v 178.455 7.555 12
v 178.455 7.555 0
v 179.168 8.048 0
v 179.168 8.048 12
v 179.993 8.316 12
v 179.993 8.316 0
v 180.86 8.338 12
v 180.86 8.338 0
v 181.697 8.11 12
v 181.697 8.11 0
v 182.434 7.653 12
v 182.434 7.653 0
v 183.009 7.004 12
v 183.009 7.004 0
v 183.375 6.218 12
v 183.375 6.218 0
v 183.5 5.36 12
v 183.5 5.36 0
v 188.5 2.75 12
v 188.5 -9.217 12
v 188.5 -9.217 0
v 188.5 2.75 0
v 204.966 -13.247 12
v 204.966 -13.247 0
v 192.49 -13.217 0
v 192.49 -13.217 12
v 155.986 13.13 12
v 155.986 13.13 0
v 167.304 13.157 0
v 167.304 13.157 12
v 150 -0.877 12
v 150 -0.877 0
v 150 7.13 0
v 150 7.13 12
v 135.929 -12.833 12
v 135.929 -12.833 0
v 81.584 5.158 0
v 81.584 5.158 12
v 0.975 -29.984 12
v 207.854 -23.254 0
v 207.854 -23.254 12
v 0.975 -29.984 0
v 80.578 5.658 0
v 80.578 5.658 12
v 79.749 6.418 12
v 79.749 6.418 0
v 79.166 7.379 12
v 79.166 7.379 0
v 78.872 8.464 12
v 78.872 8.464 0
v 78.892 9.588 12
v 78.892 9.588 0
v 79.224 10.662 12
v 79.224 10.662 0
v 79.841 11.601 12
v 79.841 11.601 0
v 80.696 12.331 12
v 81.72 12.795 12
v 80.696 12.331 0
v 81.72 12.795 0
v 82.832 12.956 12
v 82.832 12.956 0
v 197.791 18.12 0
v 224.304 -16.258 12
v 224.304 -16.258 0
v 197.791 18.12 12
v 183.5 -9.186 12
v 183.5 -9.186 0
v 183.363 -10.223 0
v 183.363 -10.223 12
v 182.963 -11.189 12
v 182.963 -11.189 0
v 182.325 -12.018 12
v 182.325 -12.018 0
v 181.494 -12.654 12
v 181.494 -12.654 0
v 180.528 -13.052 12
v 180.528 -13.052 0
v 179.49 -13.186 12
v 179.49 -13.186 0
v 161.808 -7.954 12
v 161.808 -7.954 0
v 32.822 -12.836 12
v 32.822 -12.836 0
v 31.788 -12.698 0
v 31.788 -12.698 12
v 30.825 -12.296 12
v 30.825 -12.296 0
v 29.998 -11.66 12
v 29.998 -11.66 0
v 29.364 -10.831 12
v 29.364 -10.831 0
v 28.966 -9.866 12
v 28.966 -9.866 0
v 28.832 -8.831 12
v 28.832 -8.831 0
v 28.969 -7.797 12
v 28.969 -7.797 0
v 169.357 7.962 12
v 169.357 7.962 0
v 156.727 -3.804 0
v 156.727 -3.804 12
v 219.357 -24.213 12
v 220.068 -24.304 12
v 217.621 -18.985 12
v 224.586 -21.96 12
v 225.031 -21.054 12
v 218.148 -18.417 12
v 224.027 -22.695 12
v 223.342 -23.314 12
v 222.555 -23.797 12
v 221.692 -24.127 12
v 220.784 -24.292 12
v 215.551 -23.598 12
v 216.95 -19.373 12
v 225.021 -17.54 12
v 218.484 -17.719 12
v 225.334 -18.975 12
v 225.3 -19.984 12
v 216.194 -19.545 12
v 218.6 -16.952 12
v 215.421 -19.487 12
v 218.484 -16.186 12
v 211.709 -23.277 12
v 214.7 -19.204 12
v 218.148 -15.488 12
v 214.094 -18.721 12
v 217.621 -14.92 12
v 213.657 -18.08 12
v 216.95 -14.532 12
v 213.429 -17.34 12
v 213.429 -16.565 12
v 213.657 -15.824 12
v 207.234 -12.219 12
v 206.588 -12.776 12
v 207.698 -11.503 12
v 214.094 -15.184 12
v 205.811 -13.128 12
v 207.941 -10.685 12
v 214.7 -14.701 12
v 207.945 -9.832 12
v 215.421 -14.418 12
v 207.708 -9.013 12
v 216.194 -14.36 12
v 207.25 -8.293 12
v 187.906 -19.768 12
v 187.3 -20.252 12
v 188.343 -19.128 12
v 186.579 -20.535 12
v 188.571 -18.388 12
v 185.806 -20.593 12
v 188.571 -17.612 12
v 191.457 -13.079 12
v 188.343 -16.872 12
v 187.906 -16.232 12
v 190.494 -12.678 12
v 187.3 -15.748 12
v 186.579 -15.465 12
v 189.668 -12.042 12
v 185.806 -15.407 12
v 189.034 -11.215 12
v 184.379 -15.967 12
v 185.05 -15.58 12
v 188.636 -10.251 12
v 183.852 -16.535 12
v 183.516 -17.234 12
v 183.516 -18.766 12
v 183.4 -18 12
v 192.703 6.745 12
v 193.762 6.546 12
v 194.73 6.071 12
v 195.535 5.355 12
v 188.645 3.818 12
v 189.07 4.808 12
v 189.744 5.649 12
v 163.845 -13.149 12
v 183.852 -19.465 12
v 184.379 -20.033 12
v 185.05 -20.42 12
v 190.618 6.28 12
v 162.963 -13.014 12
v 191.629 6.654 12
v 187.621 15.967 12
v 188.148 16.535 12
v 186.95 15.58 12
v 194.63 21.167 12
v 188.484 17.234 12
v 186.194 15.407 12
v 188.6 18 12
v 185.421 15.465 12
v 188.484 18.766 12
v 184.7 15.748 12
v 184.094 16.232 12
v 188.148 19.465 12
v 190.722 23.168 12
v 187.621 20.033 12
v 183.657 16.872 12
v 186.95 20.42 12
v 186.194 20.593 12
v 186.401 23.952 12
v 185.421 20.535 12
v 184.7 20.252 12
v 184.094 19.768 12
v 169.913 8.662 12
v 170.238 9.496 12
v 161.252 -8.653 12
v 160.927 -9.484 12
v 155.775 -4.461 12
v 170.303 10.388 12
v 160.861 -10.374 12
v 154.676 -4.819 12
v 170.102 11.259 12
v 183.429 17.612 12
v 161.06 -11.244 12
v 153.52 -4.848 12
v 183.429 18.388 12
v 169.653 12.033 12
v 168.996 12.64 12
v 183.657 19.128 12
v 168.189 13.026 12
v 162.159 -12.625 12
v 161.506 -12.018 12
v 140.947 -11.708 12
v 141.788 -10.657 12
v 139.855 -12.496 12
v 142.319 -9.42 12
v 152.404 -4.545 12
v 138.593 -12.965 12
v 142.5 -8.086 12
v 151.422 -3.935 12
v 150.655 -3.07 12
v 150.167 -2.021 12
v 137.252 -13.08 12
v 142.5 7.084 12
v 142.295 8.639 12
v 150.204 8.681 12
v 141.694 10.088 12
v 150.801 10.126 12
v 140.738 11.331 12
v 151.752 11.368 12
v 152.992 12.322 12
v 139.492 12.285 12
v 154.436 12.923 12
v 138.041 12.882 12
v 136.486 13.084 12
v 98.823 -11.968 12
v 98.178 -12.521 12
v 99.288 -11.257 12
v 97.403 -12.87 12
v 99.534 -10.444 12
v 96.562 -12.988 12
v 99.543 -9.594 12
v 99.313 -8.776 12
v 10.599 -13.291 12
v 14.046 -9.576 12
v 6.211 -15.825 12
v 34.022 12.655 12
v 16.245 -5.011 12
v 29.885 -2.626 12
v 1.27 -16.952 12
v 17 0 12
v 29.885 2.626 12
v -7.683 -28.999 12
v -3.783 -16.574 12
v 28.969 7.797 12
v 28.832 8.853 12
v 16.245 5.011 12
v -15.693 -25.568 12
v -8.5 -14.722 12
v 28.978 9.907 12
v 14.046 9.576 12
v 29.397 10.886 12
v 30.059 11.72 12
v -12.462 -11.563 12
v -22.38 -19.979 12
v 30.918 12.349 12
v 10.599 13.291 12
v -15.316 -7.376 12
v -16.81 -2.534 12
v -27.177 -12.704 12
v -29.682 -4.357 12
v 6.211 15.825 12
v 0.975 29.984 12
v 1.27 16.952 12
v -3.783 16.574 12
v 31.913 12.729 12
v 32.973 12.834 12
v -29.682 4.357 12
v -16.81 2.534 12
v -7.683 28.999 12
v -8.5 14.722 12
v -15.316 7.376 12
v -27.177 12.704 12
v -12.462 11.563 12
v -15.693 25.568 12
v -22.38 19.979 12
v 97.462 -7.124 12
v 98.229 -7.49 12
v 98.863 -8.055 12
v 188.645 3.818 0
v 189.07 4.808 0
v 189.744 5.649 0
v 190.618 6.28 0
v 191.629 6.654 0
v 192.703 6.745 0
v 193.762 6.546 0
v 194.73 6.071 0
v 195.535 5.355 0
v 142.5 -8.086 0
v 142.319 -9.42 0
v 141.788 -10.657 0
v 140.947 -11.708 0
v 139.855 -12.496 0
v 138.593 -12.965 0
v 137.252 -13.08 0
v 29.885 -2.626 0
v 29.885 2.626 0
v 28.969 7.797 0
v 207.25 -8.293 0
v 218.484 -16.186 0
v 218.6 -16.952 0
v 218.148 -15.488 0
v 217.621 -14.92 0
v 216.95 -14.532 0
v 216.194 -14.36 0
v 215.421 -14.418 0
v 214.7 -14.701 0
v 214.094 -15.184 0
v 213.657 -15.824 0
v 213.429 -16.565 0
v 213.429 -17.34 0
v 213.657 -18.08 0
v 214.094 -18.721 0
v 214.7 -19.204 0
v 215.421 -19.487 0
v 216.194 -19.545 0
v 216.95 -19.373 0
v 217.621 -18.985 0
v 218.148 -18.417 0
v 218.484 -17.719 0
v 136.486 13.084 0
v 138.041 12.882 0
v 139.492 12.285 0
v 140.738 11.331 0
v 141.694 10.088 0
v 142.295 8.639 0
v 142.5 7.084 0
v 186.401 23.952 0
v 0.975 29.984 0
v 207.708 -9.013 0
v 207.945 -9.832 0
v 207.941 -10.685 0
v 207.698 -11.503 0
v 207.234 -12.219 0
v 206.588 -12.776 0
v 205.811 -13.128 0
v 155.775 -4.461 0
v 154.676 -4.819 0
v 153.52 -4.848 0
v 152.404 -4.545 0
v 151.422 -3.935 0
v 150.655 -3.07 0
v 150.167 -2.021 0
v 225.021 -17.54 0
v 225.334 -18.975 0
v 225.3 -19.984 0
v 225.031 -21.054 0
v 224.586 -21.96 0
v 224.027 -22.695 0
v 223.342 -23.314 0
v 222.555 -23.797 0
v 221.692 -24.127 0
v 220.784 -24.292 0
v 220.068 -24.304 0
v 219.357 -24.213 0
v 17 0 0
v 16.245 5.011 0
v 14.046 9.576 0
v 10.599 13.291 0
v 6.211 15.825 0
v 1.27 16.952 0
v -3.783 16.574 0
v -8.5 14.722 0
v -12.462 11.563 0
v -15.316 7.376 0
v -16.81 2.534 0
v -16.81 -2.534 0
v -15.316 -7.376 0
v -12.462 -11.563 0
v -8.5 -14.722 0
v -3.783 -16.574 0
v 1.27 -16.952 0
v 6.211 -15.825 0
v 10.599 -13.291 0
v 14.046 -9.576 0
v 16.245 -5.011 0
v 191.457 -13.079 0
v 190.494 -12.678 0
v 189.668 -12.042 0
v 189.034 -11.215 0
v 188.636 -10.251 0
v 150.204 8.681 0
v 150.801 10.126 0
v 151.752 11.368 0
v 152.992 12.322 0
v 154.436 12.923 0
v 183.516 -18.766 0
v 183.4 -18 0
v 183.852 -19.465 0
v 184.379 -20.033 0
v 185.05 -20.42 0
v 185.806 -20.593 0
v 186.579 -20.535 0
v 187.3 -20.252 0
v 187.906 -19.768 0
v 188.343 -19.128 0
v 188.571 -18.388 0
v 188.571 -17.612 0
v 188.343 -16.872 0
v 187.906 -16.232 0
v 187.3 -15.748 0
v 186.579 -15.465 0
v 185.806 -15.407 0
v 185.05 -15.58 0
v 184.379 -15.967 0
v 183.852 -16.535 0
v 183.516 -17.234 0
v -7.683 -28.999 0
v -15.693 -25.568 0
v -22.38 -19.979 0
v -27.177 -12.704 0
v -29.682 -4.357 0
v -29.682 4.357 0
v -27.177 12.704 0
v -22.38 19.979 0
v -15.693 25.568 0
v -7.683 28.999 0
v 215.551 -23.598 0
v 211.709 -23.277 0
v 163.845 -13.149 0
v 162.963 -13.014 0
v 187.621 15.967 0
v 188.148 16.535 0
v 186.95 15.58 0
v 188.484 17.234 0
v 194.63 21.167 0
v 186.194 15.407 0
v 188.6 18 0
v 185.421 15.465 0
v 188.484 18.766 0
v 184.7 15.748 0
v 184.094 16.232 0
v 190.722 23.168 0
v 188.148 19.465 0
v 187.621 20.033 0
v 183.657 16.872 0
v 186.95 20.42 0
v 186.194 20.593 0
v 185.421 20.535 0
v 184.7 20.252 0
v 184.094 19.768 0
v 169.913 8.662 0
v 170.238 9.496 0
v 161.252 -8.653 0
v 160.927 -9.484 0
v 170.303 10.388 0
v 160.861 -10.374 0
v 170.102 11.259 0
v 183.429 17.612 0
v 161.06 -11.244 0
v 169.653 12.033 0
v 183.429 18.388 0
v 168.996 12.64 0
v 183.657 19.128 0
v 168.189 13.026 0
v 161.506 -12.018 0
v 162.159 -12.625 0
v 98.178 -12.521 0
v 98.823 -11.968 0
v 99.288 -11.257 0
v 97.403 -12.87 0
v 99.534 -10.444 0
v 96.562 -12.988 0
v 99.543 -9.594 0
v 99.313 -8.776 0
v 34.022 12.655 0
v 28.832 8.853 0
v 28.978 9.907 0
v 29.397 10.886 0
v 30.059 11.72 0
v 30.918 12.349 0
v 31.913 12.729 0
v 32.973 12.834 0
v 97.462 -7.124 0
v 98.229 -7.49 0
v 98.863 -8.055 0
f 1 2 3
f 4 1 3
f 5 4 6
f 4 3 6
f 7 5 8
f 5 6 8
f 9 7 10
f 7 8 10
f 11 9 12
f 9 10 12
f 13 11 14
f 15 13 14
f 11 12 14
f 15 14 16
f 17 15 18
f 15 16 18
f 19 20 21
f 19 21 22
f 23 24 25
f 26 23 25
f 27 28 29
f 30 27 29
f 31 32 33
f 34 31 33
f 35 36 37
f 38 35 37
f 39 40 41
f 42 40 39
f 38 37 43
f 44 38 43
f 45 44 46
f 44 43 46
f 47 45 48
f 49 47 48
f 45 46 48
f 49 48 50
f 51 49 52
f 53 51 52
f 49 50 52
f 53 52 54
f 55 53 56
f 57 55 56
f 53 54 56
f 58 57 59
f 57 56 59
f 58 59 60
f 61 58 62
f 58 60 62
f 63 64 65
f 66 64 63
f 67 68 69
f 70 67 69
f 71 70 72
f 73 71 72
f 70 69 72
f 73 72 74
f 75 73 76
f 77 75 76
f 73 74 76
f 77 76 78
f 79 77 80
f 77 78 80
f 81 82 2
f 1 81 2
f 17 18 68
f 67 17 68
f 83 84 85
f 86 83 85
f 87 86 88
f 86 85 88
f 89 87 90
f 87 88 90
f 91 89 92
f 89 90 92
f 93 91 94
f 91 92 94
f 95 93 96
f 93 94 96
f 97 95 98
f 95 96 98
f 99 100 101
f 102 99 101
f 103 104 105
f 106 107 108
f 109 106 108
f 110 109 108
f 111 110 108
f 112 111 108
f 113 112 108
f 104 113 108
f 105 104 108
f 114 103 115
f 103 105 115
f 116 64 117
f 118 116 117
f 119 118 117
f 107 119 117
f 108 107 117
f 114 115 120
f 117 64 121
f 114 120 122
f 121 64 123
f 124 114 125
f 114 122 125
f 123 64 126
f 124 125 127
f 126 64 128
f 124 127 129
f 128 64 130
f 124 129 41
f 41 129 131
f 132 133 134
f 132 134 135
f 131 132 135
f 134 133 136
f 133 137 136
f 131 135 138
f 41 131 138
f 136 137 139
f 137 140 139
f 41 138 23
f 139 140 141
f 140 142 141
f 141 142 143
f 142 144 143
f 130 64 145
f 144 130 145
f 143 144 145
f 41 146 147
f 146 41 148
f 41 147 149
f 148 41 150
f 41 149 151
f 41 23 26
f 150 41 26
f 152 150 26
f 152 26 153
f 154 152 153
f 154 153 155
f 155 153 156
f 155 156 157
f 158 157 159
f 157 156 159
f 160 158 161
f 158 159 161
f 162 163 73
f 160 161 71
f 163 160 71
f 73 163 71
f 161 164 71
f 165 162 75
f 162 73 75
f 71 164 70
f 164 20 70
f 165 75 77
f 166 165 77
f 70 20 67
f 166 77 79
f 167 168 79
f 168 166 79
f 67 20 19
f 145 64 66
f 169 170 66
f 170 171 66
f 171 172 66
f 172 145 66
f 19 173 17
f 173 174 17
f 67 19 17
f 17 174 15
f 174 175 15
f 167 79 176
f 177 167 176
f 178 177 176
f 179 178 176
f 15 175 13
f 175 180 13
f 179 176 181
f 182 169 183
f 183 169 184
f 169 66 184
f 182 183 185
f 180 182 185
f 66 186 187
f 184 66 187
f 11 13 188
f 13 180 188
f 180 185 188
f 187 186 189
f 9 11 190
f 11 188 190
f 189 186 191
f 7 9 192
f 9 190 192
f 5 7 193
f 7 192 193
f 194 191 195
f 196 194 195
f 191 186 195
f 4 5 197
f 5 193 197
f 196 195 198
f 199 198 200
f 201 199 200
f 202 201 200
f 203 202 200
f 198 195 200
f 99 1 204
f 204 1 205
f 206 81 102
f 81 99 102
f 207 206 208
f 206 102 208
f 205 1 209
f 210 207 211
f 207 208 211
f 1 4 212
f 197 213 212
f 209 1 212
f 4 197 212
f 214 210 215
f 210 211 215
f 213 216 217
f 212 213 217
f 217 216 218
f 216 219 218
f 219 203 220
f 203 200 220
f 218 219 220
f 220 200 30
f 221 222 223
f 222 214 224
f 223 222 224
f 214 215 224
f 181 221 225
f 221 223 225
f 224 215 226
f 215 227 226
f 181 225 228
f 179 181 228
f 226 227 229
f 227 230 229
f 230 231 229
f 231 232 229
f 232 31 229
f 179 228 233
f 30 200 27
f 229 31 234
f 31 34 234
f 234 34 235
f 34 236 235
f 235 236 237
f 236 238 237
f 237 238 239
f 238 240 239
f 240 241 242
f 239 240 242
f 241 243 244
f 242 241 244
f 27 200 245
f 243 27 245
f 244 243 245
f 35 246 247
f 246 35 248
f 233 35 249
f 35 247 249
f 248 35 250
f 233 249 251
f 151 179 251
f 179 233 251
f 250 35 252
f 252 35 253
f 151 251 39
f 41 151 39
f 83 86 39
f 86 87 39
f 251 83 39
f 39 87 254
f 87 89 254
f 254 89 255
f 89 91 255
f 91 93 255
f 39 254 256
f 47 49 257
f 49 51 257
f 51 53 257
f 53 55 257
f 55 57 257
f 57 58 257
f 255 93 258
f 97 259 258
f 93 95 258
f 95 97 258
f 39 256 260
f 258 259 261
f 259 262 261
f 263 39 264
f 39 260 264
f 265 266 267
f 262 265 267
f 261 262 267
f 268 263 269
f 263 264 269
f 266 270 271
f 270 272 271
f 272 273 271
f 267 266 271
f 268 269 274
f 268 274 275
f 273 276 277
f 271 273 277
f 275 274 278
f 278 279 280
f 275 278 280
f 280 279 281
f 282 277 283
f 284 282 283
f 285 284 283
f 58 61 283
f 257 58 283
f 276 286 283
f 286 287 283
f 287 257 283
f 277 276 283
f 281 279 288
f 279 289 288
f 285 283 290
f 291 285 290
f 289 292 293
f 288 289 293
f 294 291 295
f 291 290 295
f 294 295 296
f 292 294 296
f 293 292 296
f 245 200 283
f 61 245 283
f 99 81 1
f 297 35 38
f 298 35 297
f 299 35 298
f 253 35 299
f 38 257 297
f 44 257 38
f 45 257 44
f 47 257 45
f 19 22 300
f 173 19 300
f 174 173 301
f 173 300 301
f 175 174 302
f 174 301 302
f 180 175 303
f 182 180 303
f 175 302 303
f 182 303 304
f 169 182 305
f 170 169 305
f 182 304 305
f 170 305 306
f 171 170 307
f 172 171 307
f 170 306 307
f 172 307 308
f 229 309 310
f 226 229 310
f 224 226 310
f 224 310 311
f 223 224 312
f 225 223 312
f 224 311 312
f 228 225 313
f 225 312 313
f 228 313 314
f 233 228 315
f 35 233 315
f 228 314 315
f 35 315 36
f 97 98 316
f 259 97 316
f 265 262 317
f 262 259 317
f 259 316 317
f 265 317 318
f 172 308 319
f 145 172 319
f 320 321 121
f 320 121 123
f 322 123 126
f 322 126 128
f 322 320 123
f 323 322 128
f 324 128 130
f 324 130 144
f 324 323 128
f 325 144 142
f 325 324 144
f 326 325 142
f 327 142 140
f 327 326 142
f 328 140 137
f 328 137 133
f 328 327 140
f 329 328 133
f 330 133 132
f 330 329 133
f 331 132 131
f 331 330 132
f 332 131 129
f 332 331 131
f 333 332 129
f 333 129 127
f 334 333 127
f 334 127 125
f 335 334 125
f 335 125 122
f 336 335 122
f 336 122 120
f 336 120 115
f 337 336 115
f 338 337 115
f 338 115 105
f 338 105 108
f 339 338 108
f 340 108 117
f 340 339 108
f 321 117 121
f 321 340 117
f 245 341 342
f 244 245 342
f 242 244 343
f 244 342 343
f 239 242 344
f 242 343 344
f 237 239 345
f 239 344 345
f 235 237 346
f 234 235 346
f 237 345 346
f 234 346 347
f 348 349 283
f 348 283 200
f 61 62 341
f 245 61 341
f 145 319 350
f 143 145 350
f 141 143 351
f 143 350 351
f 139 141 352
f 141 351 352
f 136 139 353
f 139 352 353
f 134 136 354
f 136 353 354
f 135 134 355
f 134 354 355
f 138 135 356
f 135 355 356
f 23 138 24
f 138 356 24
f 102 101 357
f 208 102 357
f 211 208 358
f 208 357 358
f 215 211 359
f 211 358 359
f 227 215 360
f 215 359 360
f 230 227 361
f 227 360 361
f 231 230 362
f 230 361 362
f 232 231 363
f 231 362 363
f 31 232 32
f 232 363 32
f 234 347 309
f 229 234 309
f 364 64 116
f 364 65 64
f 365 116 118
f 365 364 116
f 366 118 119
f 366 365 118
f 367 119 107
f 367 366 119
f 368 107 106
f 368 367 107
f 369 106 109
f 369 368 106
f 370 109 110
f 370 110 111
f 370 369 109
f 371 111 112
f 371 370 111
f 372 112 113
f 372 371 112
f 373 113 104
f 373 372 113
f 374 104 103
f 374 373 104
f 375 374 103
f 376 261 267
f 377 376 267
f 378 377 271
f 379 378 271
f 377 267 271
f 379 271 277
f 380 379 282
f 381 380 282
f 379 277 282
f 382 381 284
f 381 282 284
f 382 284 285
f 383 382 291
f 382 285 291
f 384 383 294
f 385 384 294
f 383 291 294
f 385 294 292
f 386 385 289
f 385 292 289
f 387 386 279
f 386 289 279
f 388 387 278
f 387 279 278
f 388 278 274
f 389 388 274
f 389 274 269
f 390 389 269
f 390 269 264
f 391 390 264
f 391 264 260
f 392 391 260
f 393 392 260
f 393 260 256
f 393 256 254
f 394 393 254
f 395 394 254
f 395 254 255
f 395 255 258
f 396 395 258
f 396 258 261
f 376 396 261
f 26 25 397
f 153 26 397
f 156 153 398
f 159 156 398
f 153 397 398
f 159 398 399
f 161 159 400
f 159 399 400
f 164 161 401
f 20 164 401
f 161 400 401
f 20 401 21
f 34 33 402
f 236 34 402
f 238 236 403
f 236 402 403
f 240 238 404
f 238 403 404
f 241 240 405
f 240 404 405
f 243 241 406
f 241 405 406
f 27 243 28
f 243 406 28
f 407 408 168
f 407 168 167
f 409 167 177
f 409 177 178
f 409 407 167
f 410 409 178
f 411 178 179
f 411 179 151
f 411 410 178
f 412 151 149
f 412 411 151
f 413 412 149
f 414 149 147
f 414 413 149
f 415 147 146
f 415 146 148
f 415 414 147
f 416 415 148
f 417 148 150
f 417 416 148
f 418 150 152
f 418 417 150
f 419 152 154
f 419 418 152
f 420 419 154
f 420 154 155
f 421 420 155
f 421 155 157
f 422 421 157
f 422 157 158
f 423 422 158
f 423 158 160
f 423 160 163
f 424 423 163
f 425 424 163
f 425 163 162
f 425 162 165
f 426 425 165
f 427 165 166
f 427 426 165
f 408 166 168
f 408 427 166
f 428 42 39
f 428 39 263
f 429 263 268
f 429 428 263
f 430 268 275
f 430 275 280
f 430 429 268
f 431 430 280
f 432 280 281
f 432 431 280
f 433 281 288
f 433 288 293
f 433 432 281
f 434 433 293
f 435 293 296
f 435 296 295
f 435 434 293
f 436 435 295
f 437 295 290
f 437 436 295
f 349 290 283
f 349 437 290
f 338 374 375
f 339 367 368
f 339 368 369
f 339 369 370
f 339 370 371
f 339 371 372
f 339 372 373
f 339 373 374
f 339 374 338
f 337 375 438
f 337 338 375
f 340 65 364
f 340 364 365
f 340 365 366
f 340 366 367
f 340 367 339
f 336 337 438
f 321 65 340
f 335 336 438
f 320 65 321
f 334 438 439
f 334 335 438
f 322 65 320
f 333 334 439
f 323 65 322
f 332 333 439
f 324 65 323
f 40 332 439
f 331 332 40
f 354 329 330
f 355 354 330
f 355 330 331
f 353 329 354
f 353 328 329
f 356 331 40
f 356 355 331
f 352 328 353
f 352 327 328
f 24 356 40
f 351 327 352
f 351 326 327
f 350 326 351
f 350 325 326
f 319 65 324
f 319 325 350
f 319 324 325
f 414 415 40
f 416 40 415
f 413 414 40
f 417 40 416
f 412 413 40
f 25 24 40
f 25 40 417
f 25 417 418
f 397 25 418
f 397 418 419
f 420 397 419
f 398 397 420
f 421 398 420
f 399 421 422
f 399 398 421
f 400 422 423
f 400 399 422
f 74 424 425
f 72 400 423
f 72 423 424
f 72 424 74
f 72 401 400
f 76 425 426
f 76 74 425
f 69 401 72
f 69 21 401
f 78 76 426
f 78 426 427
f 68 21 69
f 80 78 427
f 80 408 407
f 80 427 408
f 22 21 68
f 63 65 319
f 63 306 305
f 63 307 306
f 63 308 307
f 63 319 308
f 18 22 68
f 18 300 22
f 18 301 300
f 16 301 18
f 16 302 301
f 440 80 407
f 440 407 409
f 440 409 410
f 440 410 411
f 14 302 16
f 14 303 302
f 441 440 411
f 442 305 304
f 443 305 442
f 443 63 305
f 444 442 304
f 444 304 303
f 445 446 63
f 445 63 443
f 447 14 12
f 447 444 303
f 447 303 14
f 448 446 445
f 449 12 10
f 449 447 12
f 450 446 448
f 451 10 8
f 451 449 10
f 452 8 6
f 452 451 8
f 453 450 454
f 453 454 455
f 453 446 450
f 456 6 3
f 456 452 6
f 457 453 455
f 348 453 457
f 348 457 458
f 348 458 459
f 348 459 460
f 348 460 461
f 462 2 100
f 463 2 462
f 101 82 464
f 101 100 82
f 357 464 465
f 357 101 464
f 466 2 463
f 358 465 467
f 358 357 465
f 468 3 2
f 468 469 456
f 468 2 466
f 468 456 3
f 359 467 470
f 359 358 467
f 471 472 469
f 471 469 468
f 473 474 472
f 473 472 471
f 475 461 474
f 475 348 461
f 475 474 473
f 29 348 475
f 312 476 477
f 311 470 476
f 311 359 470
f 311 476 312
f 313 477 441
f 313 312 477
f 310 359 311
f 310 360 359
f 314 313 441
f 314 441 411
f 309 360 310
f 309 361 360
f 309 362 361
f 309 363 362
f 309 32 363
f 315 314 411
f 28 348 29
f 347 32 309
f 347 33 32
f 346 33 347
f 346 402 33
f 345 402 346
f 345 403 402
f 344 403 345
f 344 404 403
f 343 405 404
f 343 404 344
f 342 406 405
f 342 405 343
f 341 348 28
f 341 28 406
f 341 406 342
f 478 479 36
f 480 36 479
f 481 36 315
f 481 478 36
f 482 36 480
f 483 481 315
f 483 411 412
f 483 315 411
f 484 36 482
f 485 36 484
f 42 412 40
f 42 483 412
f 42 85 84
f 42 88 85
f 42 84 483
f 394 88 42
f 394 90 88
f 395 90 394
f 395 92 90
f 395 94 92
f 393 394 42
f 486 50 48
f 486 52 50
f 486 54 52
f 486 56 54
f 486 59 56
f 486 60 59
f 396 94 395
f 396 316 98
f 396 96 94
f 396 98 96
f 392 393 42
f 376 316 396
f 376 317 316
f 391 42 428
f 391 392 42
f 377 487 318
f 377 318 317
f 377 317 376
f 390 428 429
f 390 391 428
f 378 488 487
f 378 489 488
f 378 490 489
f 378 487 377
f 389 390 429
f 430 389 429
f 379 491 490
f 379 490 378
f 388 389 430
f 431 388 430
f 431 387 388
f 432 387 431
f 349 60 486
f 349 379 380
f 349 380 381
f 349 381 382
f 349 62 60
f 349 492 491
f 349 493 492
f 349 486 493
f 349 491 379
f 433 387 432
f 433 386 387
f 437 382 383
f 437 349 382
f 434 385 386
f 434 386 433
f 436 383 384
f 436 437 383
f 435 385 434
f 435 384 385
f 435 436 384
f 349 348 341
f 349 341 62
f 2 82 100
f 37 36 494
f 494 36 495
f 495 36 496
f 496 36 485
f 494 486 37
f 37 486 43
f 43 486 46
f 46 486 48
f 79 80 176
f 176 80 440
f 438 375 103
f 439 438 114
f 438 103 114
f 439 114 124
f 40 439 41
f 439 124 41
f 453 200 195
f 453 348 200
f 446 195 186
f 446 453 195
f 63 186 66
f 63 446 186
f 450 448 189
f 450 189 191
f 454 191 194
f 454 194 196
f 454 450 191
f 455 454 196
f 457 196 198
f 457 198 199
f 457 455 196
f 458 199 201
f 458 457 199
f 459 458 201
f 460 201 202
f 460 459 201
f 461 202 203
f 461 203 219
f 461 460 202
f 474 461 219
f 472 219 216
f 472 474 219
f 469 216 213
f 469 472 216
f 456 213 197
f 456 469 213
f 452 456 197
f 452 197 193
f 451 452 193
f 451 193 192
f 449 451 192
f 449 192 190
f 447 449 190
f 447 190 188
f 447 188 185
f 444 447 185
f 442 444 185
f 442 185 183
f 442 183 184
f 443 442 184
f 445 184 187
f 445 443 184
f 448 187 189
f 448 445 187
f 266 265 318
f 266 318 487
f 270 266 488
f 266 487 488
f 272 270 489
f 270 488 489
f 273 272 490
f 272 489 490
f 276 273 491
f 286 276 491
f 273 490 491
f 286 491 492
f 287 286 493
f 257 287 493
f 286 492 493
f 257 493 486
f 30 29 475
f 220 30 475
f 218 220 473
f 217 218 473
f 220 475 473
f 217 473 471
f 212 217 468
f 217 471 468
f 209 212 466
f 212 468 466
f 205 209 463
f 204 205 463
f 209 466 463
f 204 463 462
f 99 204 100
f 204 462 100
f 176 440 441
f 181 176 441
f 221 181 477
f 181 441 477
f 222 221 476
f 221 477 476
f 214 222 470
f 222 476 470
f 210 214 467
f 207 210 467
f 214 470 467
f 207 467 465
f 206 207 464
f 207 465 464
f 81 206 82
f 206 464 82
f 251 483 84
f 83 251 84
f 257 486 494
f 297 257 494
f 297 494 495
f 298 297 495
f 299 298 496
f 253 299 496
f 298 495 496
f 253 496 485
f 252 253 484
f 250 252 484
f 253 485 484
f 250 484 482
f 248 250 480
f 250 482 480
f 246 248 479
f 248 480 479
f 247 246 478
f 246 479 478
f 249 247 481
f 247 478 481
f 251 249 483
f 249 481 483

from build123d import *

# Parameters (mm, degrees)
SKETCH_1_R           = 2.6
EXTRUDE_1_DEPTH      = 12
SKETCH_2_R           = 17
CUT_EXTRUDE_1_DEPTH  = 319.424245308
FILLET_1_R           = 50
SKETCH_7_R           = 21
CUT_EXTRUDE_6_DEPTH  = 319.424245308
SKETCH_15_R          = 48
CUT_EXTRUDE_12_DEPTH = 319.424245308
CUT_EXTRUDE_13_DEPTH = 234.372713636
CUT_EXTRUDE_14_DEPTH = 234.372713636
SKETCH_19_W          = 9.577046033
SKETCH_19_H          = 9.102233312
EXTRUDE_3_DEPTH      = 1
CUT_EXTRUDE_16_DEPTH = 234.372713636
FILLET_11_R          = 5
FILLET_12_R          = 15
FILLET_13_R          = 5


with BuildPart() as part:
    # 草图1 → 凸台-拉伸1 (new body)
    with BuildSketch(Plane.XY):
        with BuildLine():
            Line((0.975449173, 29.984137455), (231.02885683, 22.5))
            ThreePointArc((231.02885683, 22.5), (315, 0), (231.02885683, -22.5))
            Line((231.02885683, -22.5), (0.975449173, -29.984137455))
            ThreePointArc((0.975449173, -29.984137455), (-30, 0), (0.975449173, 29.984137455))
        make_face()
        with Locations((186, 18)):
            Circle(SKETCH_1_R, mode=Mode.SUBTRACT)
        with Locations(Location((186, -18, 0), (0, 0, 180))):
            Circle(SKETCH_1_R, mode=Mode.SUBTRACT)
        with Locations((216, -16.952376915)):
            Circle(SKETCH_1_R, mode=Mode.SUBTRACT)
    extrude(amount=EXTRUDE_1_DEPTH)

    # 草图2 → 切除-拉伸1 (cut, through all)
    with BuildSketch(Plane.XY.offset(12)):
        Circle(SKETCH_2_R)
    extrude(amount=-CUT_EXTRUDE_1_DEPTH, mode=Mode.SUBTRACT)

    # Fillet 1
    fillet_1_edges = [part.edges().sort_by_distance(p)[0] for p in [
        (231.02885683, 22.5, 6),
        (231.02885683, -22.5, 6),
    ]]
    fillet(fillet_1_edges, radius=FILLET_1_R)

    # 草图7 → 切除-拉伸6 (cut, through all)
    with BuildSketch(Plane.XY.offset(12)):
        with Locations((270, 0)):
            Circle(SKETCH_7_R)
    extrude(amount=-CUT_EXTRUDE_6_DEPTH, mode=Mode.SUBTRACT)

    # 草图15 → 切除-拉伸12 (cut, through all)
    with BuildSketch(Plane(origin=(0, 0, 0), x_dir=(-1, 0, 0), z_dir=(0, 0, -1))):
        with Locations((-270, 0)):
            Circle(SKETCH_15_R)
    extrude(amount=-CUT_EXTRUDE_12_DEPTH, mode=Mode.SUBTRACT)

    # 草图16 → 切除-拉伸13 (cut, through all)
    with BuildSketch(Plane(origin=(0, 0, 0), x_dir=(-1, 0, 0), z_dir=(0, 0, -1))):
        with BuildLine():
            ThreePointArc((-222, 0), (-224.338232659, 14.798750059), (-231.125125138, 28.155711755))
            ThreePointArc((-231.125125138, 28.155711755), (-223.636221951, 25.273493876), (-215.782692909, 23.62639569))
            ThreePointArc((-215.782692909, 23.62639569), (-220.419657795, 12.215374337), (-222, 0))
        make_face()
    extrude(amount=-CUT_EXTRUDE_13_DEPTH, mode=Mode.SUBTRACT)

    # 草图17 → 切除-拉伸14 (cut, through all)
    with BuildSketch(Plane(origin=(0, 0, 0), x_dir=(-1, 0, 0), z_dir=(0, 0, -1))):
        with BuildLine():
            ThreePointArc((-188.5, 2.750055906), (-191.110952969, 6.501128866), (-195.535274173, 5.355264285))
            Line((-195.535274173, 5.355264285), (-207.249830265, -8.293121713))
            ThreePointArc((-207.249830265, -8.293121713), (-207.697838632, -11.502932426), (-204.966217001, -13.247019458))
            Line((-204.966217001, -13.247019458), (-192.490456487, -13.217253727))
            ThreePointArc((-192.490456487, -13.217253727), (-189.668200744, -12.04231608), (-188.5, -9.217265111))
            Line((-188.5, -9.217265111), (-188.5, 2.750055906))
        make_face()
        with BuildLine():
            ThreePointArc((-178.455108958, 7.554652032), (-181.696939195, 8.110441149), (-183.5, 5.359561914))
            Line((-183.5, 5.359561914), (-183.5, -9.186248604))
            ThreePointArc((-183.5, -9.186248604), (-182.325050968, -12.018047861), (-179.490456487, -13.18623722))
            Line((-179.490456487, -13.18623722), (-163.845250629, -13.148909555))
            ThreePointArc((-163.845250629, -13.148909555), (-161.059570263, -11.244388724), (-161.807517222, -7.953827976))
            Line((-161.807517222, -7.953827976), (-178.455108958, 7.554652032))
        make_face()
        with BuildLine():
            Line((-155.98568473, 13.130157534), (-167.304455128, 13.15716282))
            ThreePointArc((-167.304455128, 13.15716282), (-170.101829155, 11.259302243), (-169.356503805, 7.96208124))
            Line((-169.356503805, 7.96208124), (-156.726521389, -3.803694429))
            ThreePointArc((-156.726521389, -3.803694429), (-152.404081073, -4.544746584), (-150, -0.876907605))
            Line((-150, -0.876907605), (-150, 7.130174611))
            ThreePointArc((-150, 7.130174611), (-151.752301116, 11.367751063), (-155.98568473, 13.130157534))
        make_face()
        with BuildLine():
            ThreePointArc((-136.48568473, 13.083632773), (-140.737576452, 11.331348735), (-142.5, 7.083649851))
            Line((-142.5, 7.083649851), (-142.5, -8.086038582))
            ThreePointArc((-142.5, -8.086038582), (-140.427707672, -12.139250616), (-135.928588884, -12.832686568))
            Line((-135.928588884, -12.832686568), (-81.584472606, 5.158314378))
            ThreePointArc((-81.584472606, 5.158314378), (-78.891840256, 9.587602802), (-82.832057986, 12.955621382))
            Line((-82.832057986, 12.955621382), (-136.48568473, 13.083632773))
        make_face()
        with BuildLine():
            ThreePointArc((-97.462029586, -7.12436313), (-99.534348383, -10.443548142), (-96.561920261, -12.988379256))
            Line((-96.561920261, -12.988379256), (-32.822141486, -12.836303465))
            ThreePointArc((-32.822141486, -12.836303465), (-29.654019481, -11.265809006), (-28.969133823, -7.796748397))
            ThreePointArc((-28.969133823, -7.796748397), (-30, 0), (-28.969133823, 7.796748397))
            ThreePointArc((-28.969133823, 7.796748397), (-30.059408875, 11.719799736), (-34.022287252, 12.655014403))
            Line((-34.022287252, 12.655014403), (-97.462029586, -7.12436313))
        make_face()
    extrude(amount=-CUT_EXTRUDE_14_DEPTH, mode=Mode.SUBTRACT)

    # 草图21 → 切除-拉伸16 (cut, through all)
    with BuildSketch(Plane.XY.offset(12)):
        with BuildLine():
            Line((225.346998742, -17.609925571), (193.471450892, 23.72182406))
            Line((193.471450892, 23.72182406), (207.853731728, 23.253937199))
            ThreePointArc((207.853731728, 23.253937199), (211.825615161, 23.282573441), (215.782692909, 23.62639569))
            ThreePointArc((215.782692909, 23.62639569), (220.419657795, 12.215374337), (222, 0))
            ThreePointArc((222, 0), (222.844172892, -8.962587227), (225.346998742, -17.609925571))
        make_face()
    extrude(amount=-CUT_EXTRUDE_16_DEPTH, mode=Mode.SUBTRACT)

    # 圆角11
    # the kernel refuses this fillet: 5 mm, written as the material it takes off along each edge
    with BuildSketch(Plane(origin=(231.125125138, -28.155711755, -30.280019258), x_dir=(-0.9472337070589926, 0.3205437633323705, 0), z_dir=(0, 0, 1))) as fillet_11_piece_1:
        with BuildLine():
            CenterArc((12.717608088, -4.963189315), FILLET_11_R, 96.956749804, 123.184808142)
            ThreePointArc((8.895338078, -8.186580691), (4.706429893, -3.812127139), (0, 0))
            ThreePointArc((0, 0), (6.056003852, -0.368106853), (12.112007703, 0))
        make_face()
    extrude(amount=72.560038515, mode=Mode.SUBTRACT)

    # 圆角12
    fillet_12_edges = [part.edges().sort_by_distance(p)[0] for p in [
        (193.471450892, 23.72182406, 6),
    ]]
    fillet(fillet_12_edges, radius=FILLET_12_R)

    # 圆角13
    fillet_13_edges = [part.edges().sort_by_distance(p)[0] for p in [
        (225.346030547, -17.608670152, 6),
    ]]
    fillet(fillet_13_edges, radius=FILLET_13_R)


with BuildPart() as body_2:
    # 草图19 → 凸台-拉伸3 (new body)
    with BuildSketch(Plane(origin=(0, 0, 0), x_dir=(0, 0, -1), z_dir=(1, 0, 0))):
        with Locations((4.788523017, -4.551116656)):
            Rectangle(SKETCH_19_W, SKETCH_19_H)
    extrude(amount=EXTRUDE_3_DEPTH)


solid = part.part
